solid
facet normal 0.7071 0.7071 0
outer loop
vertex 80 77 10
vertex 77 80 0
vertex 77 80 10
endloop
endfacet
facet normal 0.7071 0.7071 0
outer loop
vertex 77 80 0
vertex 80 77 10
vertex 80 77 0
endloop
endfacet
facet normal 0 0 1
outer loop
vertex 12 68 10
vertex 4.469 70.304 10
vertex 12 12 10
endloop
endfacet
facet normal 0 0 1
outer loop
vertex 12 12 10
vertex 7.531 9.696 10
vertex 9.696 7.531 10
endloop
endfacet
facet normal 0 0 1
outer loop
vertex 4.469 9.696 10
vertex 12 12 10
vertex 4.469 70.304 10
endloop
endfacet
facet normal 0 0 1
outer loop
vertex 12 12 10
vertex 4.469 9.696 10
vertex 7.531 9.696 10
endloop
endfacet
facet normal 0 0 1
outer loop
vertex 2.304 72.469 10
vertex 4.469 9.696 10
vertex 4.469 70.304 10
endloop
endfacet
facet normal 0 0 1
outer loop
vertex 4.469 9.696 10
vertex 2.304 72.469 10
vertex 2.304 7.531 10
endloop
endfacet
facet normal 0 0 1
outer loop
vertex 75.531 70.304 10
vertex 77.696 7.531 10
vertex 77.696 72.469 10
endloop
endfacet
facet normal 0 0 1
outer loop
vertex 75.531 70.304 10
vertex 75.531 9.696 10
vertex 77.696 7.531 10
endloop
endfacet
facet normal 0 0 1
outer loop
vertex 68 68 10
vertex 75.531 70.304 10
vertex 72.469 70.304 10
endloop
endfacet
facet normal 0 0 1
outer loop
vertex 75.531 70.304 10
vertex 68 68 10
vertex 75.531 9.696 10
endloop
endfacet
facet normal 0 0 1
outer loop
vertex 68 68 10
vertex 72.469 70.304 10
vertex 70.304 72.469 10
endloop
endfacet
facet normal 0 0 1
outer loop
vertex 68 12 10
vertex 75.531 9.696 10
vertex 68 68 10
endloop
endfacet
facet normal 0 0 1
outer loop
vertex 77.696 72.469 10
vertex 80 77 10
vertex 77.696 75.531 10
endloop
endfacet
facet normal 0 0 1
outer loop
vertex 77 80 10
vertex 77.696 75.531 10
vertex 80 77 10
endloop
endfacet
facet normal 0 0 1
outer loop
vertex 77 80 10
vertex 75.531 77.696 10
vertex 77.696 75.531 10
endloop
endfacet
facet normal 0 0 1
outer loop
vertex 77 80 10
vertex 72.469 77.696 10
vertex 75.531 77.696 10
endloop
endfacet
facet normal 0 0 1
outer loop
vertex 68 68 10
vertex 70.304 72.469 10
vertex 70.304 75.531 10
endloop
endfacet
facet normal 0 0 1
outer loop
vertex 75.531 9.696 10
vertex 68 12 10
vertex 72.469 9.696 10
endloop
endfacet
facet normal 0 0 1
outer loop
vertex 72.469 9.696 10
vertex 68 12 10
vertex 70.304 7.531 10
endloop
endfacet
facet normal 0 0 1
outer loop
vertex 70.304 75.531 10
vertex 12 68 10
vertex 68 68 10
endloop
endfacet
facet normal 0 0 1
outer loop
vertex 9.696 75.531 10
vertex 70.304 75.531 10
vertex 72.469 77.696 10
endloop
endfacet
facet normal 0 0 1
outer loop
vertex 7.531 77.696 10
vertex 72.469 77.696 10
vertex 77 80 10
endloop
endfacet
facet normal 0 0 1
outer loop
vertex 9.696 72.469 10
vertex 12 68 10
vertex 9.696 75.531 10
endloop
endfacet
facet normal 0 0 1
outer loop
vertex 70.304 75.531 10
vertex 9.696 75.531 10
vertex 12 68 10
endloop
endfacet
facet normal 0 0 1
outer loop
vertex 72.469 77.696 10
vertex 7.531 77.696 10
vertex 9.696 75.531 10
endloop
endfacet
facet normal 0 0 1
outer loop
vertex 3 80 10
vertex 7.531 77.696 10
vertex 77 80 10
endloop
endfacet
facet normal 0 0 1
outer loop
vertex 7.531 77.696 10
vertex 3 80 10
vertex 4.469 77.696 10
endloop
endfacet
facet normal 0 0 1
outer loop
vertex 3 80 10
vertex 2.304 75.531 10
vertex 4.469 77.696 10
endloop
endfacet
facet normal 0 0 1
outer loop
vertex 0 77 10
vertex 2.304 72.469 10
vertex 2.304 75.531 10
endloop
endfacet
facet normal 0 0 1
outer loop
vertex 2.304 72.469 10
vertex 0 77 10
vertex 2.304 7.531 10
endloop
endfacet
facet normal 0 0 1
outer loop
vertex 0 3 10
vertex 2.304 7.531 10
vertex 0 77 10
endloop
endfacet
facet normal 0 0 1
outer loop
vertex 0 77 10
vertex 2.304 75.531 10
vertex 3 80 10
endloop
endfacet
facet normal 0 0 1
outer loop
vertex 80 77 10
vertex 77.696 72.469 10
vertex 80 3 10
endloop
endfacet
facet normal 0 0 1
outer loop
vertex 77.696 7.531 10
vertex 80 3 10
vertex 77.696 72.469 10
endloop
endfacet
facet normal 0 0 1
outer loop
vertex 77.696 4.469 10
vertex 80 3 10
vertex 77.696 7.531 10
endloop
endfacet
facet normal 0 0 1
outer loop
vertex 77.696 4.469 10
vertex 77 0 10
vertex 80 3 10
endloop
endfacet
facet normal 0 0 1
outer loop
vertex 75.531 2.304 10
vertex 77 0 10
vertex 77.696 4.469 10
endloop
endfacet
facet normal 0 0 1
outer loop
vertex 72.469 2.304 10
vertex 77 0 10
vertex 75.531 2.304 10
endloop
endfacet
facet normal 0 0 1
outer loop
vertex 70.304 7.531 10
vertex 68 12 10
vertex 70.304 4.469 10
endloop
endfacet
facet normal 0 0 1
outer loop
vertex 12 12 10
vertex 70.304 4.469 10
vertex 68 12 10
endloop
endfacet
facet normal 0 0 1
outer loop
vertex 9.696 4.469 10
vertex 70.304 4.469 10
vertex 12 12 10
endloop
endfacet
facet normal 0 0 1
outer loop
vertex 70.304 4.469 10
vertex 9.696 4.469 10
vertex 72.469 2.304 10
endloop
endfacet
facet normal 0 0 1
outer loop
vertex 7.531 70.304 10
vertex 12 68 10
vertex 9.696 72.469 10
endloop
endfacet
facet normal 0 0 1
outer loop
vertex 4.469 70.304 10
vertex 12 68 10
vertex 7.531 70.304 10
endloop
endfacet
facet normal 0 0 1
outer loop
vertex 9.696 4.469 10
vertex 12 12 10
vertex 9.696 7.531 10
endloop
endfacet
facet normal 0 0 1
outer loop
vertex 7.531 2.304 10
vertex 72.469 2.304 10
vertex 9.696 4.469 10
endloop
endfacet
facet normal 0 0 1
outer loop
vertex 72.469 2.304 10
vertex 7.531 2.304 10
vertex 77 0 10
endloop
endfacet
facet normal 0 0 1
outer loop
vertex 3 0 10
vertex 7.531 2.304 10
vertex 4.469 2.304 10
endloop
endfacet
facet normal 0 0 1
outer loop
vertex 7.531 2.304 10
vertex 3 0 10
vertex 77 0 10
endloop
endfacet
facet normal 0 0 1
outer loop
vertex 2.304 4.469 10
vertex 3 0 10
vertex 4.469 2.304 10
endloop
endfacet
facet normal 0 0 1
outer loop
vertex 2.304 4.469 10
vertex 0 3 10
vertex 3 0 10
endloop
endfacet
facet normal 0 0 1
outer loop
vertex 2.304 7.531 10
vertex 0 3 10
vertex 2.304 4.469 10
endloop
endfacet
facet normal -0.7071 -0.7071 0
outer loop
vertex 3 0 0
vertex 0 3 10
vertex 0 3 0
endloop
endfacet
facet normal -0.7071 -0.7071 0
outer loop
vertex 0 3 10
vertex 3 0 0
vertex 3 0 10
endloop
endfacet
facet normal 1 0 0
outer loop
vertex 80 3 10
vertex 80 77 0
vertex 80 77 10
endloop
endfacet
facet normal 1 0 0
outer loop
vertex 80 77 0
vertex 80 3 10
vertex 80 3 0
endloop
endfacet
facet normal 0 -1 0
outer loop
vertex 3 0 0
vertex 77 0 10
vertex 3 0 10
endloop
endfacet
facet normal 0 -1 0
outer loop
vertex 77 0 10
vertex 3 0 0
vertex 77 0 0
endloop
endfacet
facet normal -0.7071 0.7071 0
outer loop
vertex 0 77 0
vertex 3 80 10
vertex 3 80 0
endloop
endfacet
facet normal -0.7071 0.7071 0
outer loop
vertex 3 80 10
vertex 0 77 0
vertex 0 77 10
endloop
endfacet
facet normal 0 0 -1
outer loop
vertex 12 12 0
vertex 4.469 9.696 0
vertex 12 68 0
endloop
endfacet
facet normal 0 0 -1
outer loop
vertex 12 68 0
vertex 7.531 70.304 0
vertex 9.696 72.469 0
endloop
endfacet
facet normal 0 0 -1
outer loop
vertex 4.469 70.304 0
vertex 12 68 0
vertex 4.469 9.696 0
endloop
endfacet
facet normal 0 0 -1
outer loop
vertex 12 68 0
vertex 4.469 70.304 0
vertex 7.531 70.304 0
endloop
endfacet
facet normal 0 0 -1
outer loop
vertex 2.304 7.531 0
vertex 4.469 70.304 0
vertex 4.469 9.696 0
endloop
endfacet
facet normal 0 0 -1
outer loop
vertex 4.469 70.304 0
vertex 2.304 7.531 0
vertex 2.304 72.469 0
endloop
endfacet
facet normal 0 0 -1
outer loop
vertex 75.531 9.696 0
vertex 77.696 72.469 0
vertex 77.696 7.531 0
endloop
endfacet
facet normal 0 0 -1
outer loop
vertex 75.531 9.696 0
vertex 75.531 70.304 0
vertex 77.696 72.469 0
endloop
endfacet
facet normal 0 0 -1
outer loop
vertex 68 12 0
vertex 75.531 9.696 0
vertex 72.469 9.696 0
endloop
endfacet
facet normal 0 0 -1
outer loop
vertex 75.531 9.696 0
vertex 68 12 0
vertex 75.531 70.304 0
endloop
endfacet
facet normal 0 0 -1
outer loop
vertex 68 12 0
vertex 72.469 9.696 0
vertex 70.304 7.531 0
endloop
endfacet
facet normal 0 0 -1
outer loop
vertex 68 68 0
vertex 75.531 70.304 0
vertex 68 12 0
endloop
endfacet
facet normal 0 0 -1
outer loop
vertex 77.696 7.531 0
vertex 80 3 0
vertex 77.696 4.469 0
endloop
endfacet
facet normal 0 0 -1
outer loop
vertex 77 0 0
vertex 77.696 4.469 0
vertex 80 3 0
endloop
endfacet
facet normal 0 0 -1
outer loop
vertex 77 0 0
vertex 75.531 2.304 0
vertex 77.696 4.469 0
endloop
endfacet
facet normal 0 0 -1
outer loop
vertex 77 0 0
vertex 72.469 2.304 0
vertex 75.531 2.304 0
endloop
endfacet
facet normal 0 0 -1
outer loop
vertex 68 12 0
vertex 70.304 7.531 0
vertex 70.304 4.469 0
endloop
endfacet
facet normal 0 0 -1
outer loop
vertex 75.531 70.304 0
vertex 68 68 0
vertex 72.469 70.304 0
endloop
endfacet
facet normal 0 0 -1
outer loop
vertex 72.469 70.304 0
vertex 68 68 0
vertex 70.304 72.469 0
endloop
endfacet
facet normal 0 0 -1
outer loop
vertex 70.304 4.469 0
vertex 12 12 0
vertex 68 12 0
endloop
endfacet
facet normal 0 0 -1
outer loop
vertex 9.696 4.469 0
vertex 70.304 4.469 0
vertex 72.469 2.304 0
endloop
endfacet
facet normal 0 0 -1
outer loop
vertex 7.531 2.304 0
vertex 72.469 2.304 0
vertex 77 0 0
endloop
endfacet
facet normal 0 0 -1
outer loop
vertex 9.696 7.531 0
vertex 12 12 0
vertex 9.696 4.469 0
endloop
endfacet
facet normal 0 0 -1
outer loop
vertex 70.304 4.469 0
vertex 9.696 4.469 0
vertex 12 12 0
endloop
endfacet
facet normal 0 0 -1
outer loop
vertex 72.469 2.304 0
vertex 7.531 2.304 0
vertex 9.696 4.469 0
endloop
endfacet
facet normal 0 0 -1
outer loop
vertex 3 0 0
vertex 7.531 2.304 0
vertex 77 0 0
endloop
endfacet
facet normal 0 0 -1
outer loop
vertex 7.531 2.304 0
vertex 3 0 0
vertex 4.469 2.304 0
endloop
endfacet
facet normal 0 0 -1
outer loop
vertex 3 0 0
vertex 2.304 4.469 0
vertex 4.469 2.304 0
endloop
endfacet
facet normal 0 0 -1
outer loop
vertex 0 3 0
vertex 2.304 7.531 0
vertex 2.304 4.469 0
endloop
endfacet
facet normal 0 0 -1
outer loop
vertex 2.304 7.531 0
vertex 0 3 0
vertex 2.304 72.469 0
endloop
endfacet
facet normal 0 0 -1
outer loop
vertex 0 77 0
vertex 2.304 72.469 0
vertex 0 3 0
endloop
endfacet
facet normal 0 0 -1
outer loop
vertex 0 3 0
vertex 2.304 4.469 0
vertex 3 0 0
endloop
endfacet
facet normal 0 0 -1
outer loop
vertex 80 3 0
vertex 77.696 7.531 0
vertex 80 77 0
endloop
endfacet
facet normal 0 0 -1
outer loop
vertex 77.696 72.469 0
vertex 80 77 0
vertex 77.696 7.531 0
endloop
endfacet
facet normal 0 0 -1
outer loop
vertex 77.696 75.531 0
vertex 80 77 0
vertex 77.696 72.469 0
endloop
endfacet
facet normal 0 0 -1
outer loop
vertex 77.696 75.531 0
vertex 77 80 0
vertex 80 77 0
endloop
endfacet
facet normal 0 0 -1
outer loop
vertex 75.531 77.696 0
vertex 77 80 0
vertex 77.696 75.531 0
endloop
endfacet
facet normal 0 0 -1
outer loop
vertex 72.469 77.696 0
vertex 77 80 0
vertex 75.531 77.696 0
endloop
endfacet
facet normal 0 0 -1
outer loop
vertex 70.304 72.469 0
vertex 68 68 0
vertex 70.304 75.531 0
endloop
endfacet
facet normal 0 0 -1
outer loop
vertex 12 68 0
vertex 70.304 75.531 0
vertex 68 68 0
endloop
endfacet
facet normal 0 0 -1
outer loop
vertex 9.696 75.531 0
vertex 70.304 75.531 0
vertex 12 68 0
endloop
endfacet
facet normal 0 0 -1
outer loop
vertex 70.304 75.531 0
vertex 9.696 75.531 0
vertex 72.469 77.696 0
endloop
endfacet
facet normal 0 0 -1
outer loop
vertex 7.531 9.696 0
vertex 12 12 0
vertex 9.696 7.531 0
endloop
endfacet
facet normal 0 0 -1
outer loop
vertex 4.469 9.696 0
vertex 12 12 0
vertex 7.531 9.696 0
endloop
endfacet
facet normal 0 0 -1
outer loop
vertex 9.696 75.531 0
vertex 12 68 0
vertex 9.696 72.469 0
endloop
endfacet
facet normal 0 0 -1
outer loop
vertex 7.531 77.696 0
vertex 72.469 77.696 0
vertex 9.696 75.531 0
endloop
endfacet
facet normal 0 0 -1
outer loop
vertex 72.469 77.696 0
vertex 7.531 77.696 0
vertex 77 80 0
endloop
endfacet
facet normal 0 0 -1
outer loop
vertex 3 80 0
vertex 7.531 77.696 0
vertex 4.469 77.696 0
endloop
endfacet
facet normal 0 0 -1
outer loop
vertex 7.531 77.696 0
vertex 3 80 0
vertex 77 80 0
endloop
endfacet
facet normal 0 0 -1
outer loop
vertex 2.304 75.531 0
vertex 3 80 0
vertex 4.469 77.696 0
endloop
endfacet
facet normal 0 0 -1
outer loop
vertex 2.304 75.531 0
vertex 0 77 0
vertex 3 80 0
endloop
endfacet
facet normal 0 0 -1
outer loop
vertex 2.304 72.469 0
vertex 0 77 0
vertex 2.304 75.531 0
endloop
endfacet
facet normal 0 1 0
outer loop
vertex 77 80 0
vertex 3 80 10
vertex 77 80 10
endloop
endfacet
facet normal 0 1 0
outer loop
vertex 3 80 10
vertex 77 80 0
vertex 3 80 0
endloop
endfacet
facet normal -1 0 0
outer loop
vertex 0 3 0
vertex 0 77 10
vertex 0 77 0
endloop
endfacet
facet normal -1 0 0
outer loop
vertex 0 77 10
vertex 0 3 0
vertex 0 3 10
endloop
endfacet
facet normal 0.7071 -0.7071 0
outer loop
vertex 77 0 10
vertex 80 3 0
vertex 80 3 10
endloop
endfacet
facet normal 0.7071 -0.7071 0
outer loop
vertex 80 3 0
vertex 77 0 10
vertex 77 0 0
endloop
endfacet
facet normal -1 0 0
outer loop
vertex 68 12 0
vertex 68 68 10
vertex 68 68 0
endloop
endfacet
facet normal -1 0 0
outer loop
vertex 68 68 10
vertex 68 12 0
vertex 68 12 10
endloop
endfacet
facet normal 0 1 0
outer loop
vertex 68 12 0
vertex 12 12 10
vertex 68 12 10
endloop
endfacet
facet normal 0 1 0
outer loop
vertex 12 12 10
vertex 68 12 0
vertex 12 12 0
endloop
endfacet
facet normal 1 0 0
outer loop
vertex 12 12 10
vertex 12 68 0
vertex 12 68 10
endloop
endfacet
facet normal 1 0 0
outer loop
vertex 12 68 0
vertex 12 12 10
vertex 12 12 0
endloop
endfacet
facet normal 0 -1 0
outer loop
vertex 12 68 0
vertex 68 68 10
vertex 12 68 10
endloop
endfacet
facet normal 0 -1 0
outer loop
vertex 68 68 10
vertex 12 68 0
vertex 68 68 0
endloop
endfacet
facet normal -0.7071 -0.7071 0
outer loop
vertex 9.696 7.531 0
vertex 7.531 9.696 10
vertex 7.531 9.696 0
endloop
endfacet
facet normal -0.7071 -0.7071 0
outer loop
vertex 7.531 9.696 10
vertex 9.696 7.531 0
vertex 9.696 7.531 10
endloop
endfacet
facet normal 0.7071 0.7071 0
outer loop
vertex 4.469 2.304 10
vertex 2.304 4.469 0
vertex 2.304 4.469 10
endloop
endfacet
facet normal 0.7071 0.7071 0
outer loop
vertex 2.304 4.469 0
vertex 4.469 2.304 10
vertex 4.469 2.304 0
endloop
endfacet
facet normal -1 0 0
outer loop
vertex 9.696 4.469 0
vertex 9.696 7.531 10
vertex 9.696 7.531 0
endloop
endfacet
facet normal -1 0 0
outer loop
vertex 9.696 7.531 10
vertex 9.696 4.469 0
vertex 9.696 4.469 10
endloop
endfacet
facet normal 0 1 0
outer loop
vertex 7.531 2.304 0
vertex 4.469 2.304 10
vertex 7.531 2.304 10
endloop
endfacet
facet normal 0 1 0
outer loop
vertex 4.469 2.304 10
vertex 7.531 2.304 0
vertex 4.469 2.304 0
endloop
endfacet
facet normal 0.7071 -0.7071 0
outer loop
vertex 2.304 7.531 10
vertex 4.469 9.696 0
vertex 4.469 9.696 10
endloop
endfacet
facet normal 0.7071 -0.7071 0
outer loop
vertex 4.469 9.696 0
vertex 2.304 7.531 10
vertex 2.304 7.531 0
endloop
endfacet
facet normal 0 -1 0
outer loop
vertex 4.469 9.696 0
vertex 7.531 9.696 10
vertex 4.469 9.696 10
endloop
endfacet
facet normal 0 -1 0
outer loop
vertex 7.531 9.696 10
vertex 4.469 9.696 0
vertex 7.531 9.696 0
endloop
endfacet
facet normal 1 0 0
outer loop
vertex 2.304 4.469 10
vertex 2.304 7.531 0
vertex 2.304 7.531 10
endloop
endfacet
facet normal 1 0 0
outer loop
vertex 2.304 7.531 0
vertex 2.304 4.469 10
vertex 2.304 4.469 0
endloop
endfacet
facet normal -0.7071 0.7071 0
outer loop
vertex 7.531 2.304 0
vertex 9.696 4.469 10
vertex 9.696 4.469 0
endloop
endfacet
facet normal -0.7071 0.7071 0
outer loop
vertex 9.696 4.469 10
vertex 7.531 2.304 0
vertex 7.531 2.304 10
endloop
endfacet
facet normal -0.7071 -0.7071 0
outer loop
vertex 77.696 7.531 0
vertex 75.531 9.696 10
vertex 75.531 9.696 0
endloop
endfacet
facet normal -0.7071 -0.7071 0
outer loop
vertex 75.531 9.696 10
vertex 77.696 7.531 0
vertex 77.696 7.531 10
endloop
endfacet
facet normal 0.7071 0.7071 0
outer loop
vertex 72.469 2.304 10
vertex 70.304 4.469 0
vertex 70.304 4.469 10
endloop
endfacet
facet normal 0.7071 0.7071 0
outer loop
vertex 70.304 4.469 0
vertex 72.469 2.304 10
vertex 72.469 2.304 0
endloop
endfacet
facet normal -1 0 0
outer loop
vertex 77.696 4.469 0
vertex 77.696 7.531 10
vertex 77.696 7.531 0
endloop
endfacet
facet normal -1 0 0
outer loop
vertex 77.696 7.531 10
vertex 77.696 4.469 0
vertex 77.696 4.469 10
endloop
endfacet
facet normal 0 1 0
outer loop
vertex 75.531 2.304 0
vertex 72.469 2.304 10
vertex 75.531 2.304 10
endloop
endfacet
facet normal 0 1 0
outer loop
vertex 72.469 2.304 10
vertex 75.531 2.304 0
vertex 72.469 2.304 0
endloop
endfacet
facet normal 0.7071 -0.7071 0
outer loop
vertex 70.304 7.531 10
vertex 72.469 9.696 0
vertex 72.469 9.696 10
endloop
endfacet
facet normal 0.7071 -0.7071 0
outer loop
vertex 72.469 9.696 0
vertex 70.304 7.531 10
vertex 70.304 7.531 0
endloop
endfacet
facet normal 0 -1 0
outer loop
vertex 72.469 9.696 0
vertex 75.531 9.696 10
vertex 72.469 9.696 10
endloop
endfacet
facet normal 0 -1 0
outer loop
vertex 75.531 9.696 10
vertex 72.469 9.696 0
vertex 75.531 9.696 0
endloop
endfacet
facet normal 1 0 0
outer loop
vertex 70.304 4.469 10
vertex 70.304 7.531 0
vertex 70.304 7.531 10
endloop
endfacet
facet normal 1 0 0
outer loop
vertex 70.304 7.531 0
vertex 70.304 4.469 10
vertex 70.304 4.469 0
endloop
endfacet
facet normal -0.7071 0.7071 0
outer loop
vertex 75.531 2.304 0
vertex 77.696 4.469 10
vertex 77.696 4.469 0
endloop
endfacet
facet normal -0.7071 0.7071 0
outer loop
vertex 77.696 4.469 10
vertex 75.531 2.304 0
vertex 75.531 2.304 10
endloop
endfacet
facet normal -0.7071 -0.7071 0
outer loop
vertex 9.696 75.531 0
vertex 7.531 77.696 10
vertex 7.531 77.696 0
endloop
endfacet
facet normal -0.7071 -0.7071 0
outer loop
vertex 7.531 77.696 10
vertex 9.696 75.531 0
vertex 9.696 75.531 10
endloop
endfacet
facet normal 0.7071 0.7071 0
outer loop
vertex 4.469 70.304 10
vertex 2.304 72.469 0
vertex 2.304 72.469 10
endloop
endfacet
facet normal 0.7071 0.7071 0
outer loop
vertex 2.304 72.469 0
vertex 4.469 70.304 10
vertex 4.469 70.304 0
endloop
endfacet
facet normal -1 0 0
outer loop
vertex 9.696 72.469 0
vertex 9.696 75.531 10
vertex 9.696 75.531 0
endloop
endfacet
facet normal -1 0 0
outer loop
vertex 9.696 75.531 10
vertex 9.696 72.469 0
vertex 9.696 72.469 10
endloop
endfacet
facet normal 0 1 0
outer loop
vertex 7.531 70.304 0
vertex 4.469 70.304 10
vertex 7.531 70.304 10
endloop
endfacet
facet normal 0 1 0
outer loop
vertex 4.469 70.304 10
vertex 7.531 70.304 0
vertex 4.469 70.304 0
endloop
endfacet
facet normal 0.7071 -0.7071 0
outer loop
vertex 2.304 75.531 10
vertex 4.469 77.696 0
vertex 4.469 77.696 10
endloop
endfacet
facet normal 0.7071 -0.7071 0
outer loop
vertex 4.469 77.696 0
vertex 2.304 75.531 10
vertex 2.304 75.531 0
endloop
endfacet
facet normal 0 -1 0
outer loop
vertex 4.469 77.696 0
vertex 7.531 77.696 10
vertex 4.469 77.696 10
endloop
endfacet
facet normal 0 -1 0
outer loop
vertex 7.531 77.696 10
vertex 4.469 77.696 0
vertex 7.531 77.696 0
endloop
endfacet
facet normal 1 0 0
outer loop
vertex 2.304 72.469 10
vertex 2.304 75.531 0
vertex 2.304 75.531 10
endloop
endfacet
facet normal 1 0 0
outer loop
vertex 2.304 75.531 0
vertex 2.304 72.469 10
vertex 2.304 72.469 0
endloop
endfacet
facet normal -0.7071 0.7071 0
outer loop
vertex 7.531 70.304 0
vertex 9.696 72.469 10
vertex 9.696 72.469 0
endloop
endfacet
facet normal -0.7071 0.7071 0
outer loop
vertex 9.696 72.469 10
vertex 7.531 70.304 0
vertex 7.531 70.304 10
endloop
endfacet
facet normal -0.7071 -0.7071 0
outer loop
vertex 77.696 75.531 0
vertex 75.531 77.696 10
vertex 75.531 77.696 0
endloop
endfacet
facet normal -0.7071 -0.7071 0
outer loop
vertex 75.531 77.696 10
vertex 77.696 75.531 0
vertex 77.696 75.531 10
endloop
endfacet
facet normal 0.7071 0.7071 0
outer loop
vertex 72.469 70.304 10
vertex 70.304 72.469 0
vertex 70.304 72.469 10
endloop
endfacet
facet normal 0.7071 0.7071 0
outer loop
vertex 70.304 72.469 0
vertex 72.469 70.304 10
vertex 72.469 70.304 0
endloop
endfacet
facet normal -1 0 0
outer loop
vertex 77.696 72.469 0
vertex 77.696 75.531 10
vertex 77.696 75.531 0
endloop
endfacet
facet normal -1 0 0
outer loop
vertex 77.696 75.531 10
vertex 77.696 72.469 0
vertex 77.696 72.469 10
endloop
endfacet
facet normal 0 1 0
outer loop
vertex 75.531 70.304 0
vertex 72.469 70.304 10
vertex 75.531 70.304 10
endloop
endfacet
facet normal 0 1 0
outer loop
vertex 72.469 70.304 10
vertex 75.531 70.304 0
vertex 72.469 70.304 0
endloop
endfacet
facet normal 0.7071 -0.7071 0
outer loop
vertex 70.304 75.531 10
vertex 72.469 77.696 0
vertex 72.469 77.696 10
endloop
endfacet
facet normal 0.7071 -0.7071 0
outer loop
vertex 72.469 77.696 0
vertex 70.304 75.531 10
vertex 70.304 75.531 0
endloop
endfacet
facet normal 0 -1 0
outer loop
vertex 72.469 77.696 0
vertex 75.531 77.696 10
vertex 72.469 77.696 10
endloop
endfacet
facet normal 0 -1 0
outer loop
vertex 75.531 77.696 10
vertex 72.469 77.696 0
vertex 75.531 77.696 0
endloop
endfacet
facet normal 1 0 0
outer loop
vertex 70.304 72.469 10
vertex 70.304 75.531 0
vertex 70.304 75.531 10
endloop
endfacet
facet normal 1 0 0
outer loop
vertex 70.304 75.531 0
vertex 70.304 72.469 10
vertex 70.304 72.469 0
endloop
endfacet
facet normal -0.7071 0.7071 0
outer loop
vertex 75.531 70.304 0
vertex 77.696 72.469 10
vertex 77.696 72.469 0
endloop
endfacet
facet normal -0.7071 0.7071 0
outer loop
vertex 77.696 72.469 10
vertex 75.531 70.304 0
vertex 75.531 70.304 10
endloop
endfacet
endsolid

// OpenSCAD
$fn = 32;

// ----------------------------------------------------------------------
// Frame plate: 80 x 80 frame, 12 mm rails
// ----------------------------------------------------------------------

// --- parameters (mm) ---
plate_l = 80;             // plate length, X
plate_w = 80;             // plate width, Y
plate_t = 10;             // plate thickness, Z (extrusion height)
corner_c = 3;             // corner chamfer
frame_bar = 12;           // frame rail width
bolt_r = 4;               // corner bolt window radius
bolt_inset = 6;           // bolt centre inset from the edges

win_l = plate_l - 2 * frame_bar;  // window length
win_w = plate_w - 2 * frame_bar;  // window width
bolt_d = 2 * bolt_r;  // corner hole diameter

profile = [[3, 0], [77, 0], [80, 3], [80, 77], [77, 80], [3, 80], [0, 77], [0, 3]];  // primary outline, 8 points, counter clockwise
void_1 = [[12, 12], [68, 12], [68, 68], [12, 68]];  // the window, 4 points
void_2 = [[9.696, 7.531], [7.531, 9.696], [4.469, 9.696], [2.304, 7.531], [2.304, 4.469], [4.469, 2.304], [7.531, 2.304], [9.696, 4.469]];  // corner bolt window, 8 points
void_3 = [[77.696, 7.531], [75.531, 9.696], [72.469, 9.696], [70.304, 7.531], [70.304, 4.469], [72.469, 2.304], [75.531, 2.304], [77.696, 4.469]];  // corner bolt window, 8 points
void_4 = [[9.696, 75.531], [7.531, 77.696], [4.469, 77.696], [2.304, 75.531], [2.304, 72.469], [4.469, 70.304], [7.531, 70.304], [9.696, 72.469]];  // corner bolt window, 8 points
void_5 = [[77.696, 75.531], [75.531, 77.696], [72.469, 77.696], [70.304, 75.531], [70.304, 72.469], [72.469, 70.304], [75.531, 70.304], [77.696, 72.469]];  // corner bolt window, 8 points

// --- the one profile operation ---
difference() {
  linear_extrude(height = plate_t) polygon(points = profile);
  translate([0, 0, -1])
    linear_extrude(height = plate_t + 2) polygon(points = void_1);
  translate([0, 0, -1])
    linear_extrude(height = plate_t + 2) polygon(points = void_2);
  translate([0, 0, -1])
    linear_extrude(height = plate_t + 2) polygon(points = void_3);
  translate([0, 0, -1])
    linear_extrude(height = plate_t + 2) polygon(points = void_4);
  translate([0, 0, -1])
    linear_extrude(height = plate_t + 2) polygon(points = void_5);
}
